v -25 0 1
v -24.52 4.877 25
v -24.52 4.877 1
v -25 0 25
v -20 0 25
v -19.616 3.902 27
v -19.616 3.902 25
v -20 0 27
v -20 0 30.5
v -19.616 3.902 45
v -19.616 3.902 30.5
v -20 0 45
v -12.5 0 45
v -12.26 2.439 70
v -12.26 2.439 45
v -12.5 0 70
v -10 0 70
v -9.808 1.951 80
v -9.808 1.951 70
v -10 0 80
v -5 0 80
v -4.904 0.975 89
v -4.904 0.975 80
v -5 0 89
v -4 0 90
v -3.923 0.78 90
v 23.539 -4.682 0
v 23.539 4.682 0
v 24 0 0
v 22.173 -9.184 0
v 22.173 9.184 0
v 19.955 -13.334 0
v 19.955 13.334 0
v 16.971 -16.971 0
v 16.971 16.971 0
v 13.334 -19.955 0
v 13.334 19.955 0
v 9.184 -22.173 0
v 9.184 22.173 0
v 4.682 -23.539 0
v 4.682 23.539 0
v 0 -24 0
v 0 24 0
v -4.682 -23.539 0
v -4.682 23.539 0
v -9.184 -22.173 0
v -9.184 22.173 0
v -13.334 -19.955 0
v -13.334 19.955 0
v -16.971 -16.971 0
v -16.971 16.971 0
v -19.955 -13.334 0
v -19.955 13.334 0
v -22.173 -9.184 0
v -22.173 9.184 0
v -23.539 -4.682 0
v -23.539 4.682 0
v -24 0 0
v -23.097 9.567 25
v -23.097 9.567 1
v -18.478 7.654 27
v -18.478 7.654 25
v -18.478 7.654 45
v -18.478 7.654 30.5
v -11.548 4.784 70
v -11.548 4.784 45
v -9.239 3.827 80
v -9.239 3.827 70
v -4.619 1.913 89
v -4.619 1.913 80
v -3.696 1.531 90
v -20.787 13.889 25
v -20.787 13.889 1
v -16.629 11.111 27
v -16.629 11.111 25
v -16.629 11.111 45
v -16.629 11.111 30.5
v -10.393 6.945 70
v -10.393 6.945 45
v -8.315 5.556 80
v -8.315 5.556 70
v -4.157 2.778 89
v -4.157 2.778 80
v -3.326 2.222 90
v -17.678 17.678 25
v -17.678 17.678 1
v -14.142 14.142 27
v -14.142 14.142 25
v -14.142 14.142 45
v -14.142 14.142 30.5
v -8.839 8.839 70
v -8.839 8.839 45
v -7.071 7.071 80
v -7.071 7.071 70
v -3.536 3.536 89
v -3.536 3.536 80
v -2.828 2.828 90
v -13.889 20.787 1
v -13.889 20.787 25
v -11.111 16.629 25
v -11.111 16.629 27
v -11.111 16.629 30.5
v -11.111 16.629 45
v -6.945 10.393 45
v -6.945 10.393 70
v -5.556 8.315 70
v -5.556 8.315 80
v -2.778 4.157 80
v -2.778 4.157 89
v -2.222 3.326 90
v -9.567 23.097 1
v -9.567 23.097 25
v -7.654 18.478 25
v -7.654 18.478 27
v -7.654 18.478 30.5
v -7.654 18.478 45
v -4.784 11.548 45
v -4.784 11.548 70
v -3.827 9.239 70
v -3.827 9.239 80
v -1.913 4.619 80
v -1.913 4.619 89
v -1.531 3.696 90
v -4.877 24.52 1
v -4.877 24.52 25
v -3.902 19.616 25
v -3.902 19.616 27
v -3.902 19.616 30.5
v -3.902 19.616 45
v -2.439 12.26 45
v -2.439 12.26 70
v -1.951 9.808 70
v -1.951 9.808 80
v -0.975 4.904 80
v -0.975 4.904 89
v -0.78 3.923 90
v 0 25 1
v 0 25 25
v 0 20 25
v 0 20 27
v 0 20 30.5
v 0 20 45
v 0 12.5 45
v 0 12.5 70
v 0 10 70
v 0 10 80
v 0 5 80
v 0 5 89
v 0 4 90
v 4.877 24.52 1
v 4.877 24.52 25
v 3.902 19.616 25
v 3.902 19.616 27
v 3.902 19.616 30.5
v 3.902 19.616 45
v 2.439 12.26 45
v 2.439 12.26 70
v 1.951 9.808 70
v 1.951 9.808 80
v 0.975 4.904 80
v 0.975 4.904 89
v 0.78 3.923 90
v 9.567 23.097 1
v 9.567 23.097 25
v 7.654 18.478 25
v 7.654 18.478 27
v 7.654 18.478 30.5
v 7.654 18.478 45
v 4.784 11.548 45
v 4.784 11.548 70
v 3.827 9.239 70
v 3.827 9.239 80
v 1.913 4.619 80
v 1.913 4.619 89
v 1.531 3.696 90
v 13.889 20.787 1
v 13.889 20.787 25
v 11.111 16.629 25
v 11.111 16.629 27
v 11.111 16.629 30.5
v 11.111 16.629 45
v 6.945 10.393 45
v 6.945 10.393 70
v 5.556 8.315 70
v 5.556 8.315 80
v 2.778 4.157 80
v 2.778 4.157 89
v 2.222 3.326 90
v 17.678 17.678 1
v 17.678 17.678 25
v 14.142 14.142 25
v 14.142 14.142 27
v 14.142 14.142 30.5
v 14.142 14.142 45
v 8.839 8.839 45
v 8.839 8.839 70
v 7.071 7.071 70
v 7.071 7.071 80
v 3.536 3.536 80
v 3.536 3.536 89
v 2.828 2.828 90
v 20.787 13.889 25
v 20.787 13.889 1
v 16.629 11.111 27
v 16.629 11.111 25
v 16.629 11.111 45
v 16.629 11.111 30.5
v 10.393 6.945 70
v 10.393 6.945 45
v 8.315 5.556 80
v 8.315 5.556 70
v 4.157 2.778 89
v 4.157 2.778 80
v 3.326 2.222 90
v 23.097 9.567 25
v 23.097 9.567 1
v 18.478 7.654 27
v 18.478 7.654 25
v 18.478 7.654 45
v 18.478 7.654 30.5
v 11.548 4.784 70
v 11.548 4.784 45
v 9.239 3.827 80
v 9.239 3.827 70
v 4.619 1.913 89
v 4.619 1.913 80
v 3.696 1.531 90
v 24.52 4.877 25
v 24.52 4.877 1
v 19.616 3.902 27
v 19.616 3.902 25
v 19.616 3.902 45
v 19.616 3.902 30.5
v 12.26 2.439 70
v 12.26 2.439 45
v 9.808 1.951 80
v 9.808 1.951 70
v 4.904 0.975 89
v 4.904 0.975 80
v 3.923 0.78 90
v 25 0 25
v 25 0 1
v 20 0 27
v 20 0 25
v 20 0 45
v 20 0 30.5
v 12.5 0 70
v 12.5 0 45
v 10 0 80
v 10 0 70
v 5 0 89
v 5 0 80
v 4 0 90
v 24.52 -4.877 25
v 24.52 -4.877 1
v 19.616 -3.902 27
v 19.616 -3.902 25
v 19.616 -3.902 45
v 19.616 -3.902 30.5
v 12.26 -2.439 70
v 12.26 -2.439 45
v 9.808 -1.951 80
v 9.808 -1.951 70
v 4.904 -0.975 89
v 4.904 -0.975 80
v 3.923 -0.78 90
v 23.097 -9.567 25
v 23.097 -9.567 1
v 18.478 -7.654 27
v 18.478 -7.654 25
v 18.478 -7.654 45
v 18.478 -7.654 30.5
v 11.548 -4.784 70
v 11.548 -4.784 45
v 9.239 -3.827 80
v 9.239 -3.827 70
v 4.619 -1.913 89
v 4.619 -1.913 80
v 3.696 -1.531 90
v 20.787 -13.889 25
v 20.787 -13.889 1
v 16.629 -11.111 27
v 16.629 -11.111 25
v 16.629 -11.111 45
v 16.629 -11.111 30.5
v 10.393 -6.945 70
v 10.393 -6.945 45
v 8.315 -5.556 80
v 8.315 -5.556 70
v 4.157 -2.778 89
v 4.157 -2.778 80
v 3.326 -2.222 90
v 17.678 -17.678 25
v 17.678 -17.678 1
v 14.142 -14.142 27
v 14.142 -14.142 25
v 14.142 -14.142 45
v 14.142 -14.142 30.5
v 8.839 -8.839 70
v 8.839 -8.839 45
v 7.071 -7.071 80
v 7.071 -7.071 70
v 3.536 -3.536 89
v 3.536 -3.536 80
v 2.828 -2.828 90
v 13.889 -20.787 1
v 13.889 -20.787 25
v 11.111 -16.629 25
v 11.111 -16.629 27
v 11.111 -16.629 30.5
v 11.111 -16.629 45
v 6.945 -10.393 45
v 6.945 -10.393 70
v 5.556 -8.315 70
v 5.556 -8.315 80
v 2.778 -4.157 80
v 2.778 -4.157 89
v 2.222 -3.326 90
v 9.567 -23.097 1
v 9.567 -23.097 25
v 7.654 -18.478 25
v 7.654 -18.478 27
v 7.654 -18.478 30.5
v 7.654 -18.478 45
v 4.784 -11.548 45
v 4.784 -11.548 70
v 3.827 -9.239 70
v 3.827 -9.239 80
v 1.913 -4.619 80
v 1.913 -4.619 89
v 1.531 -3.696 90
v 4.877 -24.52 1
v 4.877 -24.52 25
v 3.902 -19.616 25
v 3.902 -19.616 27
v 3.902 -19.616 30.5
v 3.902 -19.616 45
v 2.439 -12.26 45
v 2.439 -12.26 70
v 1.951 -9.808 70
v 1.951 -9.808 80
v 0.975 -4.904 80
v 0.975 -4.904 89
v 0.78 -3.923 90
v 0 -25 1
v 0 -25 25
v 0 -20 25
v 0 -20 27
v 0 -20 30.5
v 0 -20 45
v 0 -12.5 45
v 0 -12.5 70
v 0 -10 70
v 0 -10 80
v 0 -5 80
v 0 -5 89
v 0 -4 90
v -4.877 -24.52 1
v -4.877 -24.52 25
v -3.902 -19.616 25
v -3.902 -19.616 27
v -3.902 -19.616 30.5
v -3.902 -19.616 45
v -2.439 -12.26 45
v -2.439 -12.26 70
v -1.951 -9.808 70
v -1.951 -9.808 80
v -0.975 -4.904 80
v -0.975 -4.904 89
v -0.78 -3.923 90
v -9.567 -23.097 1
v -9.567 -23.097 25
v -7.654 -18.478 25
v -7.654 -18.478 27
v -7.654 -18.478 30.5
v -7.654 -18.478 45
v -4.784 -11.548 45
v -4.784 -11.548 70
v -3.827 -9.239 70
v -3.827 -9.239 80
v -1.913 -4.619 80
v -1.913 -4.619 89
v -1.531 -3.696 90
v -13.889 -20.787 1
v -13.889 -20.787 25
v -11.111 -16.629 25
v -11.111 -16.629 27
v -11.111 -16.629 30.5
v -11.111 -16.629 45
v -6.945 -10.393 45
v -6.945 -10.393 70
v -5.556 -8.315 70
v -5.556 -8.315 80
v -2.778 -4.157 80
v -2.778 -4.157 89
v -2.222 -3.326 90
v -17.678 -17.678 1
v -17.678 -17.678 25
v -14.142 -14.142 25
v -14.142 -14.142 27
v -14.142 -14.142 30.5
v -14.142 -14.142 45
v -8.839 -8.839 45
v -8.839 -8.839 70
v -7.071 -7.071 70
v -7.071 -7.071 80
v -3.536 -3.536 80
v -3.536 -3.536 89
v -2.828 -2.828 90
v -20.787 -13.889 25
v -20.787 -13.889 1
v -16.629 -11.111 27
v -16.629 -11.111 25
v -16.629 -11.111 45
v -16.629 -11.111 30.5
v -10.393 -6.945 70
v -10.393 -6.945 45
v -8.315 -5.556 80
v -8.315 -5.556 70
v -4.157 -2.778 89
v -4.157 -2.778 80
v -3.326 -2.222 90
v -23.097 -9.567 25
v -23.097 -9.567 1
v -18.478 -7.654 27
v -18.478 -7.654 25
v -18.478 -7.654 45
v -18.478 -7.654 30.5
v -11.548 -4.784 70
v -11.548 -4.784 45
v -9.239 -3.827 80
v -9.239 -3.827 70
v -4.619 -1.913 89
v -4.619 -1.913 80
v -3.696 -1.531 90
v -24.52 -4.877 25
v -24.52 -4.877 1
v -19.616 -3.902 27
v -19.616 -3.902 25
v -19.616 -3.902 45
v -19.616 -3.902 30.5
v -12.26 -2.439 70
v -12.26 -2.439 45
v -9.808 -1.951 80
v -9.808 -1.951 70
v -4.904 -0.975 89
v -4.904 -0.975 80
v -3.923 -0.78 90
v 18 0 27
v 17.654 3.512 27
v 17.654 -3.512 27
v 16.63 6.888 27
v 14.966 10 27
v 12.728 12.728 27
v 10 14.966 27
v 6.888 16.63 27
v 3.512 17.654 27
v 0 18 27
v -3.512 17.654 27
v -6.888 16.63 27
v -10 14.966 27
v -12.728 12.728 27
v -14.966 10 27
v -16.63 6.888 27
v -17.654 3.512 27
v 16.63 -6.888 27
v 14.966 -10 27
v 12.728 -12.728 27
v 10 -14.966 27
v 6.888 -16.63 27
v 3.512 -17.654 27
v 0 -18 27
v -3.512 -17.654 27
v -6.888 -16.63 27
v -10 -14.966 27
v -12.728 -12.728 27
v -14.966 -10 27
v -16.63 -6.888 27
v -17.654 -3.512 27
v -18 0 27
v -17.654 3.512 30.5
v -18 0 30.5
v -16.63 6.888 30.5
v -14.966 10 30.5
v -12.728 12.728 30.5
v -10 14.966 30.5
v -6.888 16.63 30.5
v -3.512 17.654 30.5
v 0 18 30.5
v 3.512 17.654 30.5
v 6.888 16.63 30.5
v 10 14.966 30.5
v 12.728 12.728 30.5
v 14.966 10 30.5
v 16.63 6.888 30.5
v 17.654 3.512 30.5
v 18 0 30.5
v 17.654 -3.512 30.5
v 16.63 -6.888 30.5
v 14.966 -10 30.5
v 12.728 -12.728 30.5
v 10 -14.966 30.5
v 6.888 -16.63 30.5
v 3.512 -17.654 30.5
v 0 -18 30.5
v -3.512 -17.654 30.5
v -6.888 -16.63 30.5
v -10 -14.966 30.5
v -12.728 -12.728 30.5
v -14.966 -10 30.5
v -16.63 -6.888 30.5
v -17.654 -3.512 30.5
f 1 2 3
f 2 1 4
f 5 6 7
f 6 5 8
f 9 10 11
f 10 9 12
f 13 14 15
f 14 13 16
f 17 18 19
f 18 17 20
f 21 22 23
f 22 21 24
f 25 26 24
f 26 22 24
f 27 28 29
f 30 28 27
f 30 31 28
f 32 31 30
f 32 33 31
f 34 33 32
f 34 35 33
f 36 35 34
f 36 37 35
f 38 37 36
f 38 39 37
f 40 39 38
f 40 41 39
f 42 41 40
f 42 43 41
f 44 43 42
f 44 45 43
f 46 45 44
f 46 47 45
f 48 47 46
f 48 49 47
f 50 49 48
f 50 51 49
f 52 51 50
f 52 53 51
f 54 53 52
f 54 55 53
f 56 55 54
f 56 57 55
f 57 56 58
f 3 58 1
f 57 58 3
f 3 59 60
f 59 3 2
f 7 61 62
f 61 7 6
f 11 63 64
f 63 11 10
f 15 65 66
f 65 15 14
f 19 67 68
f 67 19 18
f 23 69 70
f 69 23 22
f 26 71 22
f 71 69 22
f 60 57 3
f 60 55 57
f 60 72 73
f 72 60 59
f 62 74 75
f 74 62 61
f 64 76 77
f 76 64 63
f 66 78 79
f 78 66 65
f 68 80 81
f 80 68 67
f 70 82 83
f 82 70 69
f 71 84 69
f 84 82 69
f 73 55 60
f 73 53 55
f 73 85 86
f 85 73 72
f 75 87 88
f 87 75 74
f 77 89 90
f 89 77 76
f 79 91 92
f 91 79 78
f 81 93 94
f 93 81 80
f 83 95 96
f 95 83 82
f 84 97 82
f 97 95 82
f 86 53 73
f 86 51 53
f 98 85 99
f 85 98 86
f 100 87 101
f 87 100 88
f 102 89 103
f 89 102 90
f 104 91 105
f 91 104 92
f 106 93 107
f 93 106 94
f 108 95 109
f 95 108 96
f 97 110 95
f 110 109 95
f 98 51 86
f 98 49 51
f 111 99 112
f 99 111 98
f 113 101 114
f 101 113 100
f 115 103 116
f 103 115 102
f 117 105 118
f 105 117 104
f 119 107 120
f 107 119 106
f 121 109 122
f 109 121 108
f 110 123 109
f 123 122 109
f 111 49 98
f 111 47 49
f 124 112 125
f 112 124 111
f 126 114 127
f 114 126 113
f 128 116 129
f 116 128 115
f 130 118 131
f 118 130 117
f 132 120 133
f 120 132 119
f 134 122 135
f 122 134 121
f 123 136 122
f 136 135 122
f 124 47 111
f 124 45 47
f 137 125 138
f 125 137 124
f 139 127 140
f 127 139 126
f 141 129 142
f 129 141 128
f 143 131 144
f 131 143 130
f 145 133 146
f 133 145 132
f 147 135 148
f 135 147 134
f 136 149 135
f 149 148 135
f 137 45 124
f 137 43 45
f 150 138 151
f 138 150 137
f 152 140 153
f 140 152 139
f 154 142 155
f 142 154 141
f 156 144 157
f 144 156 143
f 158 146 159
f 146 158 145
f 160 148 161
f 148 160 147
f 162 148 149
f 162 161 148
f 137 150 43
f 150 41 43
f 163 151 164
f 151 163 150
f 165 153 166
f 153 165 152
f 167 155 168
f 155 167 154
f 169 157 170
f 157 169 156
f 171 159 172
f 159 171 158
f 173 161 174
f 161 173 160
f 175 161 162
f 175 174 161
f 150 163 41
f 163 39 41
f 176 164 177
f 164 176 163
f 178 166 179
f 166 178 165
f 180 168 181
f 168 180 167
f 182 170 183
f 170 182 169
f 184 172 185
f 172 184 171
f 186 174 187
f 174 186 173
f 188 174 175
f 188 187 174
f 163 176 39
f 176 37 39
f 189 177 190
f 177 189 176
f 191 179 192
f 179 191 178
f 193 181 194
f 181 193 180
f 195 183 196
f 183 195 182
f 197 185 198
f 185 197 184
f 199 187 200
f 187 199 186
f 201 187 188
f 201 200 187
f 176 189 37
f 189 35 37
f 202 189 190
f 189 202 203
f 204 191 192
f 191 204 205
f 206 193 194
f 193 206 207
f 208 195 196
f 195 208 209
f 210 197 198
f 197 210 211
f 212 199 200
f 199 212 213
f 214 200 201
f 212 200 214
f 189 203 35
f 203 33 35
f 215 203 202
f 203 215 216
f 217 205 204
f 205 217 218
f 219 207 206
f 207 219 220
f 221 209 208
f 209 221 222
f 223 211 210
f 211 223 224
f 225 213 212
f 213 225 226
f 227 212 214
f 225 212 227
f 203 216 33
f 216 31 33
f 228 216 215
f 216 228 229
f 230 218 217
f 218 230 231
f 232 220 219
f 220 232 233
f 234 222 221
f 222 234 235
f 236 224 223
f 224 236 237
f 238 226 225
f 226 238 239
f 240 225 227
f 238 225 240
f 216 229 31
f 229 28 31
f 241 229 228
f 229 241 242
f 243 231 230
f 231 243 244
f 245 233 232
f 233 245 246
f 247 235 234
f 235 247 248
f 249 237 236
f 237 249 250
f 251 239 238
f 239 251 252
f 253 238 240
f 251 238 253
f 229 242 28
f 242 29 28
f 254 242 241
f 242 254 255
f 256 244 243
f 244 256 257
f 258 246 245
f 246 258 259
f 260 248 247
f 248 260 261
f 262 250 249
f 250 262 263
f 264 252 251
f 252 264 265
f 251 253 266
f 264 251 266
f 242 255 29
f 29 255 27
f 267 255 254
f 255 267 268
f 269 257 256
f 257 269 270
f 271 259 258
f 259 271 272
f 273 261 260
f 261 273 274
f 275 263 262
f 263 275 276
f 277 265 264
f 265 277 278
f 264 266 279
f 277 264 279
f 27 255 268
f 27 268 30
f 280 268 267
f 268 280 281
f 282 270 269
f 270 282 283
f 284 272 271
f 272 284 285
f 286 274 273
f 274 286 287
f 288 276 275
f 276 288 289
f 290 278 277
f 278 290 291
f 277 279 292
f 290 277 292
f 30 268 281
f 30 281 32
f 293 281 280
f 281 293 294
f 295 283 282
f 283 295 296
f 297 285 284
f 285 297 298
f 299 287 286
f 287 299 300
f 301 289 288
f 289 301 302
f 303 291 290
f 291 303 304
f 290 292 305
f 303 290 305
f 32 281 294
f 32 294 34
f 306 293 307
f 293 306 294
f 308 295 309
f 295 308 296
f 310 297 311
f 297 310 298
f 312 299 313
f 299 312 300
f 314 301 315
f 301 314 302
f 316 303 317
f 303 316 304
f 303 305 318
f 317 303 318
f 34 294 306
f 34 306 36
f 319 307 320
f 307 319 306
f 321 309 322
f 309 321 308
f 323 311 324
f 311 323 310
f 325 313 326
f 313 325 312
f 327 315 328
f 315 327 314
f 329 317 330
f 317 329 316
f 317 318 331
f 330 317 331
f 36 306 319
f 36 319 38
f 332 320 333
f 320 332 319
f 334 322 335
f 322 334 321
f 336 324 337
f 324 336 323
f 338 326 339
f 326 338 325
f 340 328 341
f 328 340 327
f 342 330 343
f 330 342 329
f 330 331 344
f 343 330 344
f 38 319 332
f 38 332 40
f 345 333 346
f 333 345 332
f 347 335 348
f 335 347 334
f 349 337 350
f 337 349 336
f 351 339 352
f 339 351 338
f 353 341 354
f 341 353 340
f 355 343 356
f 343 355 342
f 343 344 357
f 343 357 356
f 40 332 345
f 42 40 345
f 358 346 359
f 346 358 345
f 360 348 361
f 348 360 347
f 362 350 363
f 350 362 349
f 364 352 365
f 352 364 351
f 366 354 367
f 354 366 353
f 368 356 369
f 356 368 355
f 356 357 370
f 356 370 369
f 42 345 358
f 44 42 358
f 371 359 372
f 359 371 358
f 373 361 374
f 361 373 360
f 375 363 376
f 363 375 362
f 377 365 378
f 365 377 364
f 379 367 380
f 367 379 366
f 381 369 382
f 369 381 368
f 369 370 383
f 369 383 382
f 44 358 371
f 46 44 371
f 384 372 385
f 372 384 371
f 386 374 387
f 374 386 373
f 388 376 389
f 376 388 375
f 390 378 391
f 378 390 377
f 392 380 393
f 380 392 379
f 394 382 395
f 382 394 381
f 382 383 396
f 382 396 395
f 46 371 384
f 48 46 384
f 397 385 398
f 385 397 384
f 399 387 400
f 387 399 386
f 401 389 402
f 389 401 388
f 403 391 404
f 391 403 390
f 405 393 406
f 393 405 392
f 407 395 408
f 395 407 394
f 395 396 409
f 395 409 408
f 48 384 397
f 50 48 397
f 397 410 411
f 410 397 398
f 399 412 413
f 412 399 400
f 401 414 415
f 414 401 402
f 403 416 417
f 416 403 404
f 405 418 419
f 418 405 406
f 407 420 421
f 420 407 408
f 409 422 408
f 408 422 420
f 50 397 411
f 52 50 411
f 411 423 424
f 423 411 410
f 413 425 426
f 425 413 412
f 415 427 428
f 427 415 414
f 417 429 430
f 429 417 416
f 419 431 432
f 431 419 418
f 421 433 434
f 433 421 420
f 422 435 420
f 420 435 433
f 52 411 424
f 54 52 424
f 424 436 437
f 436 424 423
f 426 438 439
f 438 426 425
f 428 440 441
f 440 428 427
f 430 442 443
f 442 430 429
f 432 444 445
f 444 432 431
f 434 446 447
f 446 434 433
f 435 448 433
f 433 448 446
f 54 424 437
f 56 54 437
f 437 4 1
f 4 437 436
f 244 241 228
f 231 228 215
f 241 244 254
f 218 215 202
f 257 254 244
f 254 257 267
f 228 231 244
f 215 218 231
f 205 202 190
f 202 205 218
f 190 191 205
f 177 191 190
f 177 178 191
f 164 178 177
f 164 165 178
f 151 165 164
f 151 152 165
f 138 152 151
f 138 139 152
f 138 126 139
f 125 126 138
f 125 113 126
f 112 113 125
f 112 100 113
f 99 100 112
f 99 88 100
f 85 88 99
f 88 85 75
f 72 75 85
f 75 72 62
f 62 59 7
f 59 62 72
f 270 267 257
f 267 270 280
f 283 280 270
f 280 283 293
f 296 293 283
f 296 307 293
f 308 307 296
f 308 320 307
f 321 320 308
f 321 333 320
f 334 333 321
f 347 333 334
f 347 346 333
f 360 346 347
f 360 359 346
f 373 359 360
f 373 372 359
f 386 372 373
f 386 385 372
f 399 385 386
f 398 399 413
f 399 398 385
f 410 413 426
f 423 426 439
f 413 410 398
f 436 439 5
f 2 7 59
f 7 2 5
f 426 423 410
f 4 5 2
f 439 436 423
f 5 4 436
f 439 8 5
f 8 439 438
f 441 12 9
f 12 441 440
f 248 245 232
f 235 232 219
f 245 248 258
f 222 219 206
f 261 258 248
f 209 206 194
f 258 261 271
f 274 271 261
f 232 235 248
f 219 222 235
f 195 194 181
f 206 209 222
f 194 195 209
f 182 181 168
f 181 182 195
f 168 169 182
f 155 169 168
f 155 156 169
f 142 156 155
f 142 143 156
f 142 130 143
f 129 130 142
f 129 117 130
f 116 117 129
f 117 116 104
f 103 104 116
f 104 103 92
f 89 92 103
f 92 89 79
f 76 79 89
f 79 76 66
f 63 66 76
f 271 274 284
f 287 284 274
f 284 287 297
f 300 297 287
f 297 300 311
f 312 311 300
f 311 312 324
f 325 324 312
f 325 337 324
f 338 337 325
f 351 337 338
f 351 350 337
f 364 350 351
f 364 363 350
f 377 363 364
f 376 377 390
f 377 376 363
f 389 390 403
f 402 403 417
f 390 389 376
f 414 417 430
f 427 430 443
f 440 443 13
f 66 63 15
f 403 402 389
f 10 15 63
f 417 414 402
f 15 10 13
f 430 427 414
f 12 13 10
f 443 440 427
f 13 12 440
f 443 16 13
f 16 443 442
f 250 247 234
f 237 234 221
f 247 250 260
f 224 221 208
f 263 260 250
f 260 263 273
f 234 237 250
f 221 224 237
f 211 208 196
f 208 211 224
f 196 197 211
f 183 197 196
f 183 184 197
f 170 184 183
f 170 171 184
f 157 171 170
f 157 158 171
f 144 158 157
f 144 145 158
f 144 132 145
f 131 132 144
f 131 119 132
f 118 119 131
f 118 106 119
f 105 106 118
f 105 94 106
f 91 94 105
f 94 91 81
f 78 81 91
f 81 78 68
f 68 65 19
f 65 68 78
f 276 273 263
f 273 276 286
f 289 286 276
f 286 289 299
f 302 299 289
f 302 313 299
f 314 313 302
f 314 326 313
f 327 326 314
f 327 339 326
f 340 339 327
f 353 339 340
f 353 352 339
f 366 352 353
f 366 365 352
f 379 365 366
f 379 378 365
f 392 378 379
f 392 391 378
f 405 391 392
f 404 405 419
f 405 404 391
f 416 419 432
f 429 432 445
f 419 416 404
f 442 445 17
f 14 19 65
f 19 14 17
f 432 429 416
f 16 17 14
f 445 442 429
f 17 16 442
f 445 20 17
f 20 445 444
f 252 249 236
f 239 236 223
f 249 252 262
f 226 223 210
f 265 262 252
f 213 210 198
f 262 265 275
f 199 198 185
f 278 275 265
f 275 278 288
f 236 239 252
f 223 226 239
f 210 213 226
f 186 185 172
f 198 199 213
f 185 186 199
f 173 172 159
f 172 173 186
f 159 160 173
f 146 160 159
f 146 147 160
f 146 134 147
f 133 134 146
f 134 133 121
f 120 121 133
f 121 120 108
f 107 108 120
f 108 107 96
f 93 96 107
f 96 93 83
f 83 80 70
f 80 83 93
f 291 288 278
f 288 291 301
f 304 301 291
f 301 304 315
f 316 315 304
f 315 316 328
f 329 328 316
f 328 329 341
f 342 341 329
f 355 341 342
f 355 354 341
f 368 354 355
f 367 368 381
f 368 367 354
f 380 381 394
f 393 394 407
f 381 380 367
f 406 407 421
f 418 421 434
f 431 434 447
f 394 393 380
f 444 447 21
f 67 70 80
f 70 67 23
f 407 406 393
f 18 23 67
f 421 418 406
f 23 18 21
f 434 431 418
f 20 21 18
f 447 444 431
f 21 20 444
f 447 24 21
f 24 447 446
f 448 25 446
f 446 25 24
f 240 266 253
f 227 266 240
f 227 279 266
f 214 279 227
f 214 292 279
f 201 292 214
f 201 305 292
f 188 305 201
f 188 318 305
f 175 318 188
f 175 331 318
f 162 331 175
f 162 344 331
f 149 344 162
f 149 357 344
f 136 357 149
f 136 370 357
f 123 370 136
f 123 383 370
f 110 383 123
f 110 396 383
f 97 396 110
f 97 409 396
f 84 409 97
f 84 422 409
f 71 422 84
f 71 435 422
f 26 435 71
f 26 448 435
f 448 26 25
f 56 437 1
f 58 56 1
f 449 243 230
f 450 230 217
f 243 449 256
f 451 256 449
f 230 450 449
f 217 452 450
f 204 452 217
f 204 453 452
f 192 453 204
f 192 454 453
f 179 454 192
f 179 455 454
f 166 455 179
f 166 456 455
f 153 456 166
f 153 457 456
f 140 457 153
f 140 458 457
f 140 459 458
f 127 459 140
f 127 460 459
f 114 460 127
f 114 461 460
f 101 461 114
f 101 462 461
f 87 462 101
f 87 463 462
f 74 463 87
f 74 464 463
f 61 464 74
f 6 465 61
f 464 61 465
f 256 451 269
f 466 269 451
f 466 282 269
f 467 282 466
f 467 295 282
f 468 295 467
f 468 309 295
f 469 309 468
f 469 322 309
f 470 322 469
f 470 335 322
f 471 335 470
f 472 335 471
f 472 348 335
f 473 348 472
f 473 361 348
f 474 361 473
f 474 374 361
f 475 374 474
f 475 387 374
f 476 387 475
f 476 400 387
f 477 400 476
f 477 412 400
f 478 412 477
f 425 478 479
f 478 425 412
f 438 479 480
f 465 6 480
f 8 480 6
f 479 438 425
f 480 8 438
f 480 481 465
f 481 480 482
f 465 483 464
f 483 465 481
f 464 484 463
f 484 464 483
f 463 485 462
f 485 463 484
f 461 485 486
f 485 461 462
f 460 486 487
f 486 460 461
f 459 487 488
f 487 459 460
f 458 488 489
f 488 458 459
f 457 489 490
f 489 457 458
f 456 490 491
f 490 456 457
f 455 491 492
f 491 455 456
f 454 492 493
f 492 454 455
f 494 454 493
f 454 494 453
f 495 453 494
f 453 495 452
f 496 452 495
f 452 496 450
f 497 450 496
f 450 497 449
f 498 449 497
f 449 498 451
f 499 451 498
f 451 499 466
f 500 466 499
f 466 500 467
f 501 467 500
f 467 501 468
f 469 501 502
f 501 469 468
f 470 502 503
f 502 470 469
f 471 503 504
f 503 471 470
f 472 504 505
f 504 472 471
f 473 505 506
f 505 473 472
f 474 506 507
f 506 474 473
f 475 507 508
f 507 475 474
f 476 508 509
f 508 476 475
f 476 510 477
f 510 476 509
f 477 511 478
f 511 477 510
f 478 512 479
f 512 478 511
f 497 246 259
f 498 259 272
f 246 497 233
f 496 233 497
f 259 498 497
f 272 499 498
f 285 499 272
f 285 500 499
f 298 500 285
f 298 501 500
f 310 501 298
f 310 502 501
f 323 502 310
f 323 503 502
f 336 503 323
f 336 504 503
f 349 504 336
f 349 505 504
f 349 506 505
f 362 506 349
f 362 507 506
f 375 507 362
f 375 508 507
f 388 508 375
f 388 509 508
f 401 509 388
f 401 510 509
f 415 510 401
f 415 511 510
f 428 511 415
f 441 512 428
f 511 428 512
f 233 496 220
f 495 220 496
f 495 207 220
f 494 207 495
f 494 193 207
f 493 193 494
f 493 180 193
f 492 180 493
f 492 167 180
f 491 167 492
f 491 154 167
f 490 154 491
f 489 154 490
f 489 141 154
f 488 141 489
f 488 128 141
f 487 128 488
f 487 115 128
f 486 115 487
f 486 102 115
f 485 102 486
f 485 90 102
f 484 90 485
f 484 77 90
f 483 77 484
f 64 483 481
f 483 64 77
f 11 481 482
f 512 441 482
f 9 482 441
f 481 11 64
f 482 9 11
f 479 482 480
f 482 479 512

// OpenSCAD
$fn = 32;

// ----------------------------------------------------------------------
// Stepped shaft: diameters 50, 40, 25, 20, 10 mm, 90 mm long
// ----------------------------------------------------------------------

// --- parameters (mm) ---
d1 = 50;                  // step 1 diameter
len1 = 25;                // step 1 length
d2 = 40;                  // step 2 diameter
len2 = 20;                // step 2 length
d3 = 25;                  // step 3 diameter
len3 = 25;                // step 3 length
d4 = 20;                  // step 4 diameter
len4 = 10;                // step 4 length
d5 = 10;                  // step 5 diameter
len5 = 10;                // step 5 length
total = 90;               // overall length
chamfer = 1;              // end chamfer
groove_r = 20;            // groove radius
groove_z = 27;            // groove position from the end
groove_w = 3.5;           // groove width
groove_d = 2;             // groove depth

/* closed turning profile: x is the radius, y is the length */
profile = [[0, 0], [25 - chamfer, 0], [25, chamfer], [25, 25], [20, 25], [20, 45], [12.5, 45], [12.5, 70], [10, 70], [10, 80], [5, 80], [5, 89], [4, 90], [0, 90]];

difference() {
  rotate_extrude() polygon(profile);
  /* circlip groove just behind the shoulder */
  rotate_extrude() translate([groove_r - groove_d, groove_z]) square([groove_d + 1, groove_w]);
}
